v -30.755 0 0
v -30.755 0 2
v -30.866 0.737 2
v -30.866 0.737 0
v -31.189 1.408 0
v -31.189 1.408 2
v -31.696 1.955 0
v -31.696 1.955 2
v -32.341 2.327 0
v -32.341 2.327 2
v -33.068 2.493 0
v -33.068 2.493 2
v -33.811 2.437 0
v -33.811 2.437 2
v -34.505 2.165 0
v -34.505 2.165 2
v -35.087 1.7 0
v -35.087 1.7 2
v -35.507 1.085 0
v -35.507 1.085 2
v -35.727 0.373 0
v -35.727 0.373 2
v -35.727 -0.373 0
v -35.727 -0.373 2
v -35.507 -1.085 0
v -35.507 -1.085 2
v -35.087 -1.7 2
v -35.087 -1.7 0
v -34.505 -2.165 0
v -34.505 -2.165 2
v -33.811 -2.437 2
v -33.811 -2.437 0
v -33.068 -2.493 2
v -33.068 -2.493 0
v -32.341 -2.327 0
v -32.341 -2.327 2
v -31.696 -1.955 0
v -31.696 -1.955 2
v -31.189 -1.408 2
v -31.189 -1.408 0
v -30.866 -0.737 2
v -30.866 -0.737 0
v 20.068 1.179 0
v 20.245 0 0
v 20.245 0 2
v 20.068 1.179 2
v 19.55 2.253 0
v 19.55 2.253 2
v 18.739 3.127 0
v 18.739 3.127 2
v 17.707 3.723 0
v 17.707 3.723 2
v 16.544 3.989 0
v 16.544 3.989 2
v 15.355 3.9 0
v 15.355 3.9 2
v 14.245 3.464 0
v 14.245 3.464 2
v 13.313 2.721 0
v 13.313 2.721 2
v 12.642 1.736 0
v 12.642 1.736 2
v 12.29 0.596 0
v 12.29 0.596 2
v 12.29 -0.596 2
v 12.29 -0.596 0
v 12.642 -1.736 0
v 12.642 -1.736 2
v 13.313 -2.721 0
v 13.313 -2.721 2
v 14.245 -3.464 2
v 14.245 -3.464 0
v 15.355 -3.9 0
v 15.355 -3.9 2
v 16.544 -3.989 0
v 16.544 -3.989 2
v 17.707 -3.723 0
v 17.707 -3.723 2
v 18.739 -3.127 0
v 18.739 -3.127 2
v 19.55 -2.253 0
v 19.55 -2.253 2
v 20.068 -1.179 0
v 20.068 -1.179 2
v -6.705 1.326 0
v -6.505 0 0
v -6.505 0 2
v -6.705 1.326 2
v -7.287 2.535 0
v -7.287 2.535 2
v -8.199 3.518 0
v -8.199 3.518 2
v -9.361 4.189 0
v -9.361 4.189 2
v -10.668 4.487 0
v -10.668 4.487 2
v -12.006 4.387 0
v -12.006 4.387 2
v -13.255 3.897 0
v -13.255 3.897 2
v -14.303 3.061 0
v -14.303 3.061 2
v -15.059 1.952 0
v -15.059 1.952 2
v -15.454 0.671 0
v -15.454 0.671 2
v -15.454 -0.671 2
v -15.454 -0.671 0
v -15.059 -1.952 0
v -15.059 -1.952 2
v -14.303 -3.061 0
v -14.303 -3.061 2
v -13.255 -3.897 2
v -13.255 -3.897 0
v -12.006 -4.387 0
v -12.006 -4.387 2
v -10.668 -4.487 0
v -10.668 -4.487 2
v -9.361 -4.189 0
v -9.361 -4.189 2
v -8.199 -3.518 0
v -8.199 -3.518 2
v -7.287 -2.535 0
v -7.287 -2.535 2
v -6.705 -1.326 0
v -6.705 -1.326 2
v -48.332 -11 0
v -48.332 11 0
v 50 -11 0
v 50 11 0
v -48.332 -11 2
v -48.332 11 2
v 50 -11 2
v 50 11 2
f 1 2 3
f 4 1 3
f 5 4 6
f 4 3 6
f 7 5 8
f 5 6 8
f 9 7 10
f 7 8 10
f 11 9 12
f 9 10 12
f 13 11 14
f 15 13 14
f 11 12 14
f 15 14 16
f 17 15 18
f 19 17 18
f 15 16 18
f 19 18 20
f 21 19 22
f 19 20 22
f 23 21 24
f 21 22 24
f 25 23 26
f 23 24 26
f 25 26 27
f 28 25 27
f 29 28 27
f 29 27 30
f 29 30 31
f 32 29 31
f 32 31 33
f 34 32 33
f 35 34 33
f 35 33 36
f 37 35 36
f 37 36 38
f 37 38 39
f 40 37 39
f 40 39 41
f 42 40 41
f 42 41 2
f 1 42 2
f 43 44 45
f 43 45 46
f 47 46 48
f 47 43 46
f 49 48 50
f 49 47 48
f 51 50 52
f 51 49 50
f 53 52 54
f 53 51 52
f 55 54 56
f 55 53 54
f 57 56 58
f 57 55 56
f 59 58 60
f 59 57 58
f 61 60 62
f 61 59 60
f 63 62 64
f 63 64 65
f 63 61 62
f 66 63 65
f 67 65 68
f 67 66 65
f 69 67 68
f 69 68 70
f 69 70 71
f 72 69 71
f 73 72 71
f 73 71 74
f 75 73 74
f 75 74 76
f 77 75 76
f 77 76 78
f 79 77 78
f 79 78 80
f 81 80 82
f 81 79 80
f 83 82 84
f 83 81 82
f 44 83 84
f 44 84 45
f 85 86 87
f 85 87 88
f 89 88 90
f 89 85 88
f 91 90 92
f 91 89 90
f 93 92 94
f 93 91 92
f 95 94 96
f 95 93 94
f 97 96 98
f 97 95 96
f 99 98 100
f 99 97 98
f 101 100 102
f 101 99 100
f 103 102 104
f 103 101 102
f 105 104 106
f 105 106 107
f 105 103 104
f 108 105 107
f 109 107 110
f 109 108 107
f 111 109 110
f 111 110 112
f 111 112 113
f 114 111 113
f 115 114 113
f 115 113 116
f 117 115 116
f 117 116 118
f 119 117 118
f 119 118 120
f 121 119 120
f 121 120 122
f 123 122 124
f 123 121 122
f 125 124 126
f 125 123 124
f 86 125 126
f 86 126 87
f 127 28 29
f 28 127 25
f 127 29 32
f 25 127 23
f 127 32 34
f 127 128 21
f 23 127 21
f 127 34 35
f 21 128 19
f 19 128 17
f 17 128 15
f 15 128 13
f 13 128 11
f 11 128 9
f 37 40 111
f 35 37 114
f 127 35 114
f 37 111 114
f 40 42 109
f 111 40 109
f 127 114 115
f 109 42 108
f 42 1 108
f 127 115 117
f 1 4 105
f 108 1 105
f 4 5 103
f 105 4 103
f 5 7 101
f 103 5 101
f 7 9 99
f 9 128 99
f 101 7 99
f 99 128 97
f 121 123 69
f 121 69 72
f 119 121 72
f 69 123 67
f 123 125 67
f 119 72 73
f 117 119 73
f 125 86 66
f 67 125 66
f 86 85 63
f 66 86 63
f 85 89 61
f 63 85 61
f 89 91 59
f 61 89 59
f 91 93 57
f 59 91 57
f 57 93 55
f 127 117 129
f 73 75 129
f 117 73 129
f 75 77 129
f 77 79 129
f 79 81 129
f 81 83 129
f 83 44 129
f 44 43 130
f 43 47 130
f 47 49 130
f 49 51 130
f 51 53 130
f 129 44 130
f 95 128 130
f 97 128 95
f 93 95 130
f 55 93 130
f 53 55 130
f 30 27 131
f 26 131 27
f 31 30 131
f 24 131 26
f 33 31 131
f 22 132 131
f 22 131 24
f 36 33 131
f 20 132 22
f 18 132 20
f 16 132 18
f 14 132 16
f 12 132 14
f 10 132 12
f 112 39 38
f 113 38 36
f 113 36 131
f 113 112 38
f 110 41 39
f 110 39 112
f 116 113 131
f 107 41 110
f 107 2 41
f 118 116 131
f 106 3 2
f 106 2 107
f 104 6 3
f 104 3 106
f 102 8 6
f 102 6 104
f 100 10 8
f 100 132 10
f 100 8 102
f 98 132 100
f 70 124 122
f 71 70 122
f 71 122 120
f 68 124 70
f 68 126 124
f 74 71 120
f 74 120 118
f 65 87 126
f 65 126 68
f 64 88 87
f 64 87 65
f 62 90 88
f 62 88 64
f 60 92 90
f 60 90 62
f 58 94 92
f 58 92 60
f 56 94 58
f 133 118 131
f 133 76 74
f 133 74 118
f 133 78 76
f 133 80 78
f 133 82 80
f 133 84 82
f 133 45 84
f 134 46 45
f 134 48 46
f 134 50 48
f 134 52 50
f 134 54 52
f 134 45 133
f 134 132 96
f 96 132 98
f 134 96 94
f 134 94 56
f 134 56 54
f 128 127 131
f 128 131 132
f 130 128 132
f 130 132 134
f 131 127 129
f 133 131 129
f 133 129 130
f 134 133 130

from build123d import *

# Parameters (mm, degrees)
F1_W     = 98.332082
F1_H     = 22
F1_R     = 4.5
F1_R_2   = 4
F2_DEPTH = 2
F3_R     = 2.5
F4_DEPTH = 25


with BuildPart() as f2:
    # F1 (on face) → F2 (new body)
    with BuildSketch(Plane.XY):
        with Locations((0.833959, 0)):
            Rectangle(F1_W, F1_H)
        with Locations((-11.0046, 0)):
            Circle(F1_R, mode=Mode.SUBTRACT)
        with Locations((16.2454, 0)):
            Circle(F1_R_2, mode=Mode.SUBTRACT)
    extrude(amount=F2_DEPTH)

    # F3 (on face) → F4 (cut)
    with BuildSketch(Plane.XY.offset(2)):
        with Locations((-33.2546, 0)):
            Circle(F3_R)
    extrude(amount=-F4_DEPTH, mode=Mode.SUBTRACT)


solid = f2.part
